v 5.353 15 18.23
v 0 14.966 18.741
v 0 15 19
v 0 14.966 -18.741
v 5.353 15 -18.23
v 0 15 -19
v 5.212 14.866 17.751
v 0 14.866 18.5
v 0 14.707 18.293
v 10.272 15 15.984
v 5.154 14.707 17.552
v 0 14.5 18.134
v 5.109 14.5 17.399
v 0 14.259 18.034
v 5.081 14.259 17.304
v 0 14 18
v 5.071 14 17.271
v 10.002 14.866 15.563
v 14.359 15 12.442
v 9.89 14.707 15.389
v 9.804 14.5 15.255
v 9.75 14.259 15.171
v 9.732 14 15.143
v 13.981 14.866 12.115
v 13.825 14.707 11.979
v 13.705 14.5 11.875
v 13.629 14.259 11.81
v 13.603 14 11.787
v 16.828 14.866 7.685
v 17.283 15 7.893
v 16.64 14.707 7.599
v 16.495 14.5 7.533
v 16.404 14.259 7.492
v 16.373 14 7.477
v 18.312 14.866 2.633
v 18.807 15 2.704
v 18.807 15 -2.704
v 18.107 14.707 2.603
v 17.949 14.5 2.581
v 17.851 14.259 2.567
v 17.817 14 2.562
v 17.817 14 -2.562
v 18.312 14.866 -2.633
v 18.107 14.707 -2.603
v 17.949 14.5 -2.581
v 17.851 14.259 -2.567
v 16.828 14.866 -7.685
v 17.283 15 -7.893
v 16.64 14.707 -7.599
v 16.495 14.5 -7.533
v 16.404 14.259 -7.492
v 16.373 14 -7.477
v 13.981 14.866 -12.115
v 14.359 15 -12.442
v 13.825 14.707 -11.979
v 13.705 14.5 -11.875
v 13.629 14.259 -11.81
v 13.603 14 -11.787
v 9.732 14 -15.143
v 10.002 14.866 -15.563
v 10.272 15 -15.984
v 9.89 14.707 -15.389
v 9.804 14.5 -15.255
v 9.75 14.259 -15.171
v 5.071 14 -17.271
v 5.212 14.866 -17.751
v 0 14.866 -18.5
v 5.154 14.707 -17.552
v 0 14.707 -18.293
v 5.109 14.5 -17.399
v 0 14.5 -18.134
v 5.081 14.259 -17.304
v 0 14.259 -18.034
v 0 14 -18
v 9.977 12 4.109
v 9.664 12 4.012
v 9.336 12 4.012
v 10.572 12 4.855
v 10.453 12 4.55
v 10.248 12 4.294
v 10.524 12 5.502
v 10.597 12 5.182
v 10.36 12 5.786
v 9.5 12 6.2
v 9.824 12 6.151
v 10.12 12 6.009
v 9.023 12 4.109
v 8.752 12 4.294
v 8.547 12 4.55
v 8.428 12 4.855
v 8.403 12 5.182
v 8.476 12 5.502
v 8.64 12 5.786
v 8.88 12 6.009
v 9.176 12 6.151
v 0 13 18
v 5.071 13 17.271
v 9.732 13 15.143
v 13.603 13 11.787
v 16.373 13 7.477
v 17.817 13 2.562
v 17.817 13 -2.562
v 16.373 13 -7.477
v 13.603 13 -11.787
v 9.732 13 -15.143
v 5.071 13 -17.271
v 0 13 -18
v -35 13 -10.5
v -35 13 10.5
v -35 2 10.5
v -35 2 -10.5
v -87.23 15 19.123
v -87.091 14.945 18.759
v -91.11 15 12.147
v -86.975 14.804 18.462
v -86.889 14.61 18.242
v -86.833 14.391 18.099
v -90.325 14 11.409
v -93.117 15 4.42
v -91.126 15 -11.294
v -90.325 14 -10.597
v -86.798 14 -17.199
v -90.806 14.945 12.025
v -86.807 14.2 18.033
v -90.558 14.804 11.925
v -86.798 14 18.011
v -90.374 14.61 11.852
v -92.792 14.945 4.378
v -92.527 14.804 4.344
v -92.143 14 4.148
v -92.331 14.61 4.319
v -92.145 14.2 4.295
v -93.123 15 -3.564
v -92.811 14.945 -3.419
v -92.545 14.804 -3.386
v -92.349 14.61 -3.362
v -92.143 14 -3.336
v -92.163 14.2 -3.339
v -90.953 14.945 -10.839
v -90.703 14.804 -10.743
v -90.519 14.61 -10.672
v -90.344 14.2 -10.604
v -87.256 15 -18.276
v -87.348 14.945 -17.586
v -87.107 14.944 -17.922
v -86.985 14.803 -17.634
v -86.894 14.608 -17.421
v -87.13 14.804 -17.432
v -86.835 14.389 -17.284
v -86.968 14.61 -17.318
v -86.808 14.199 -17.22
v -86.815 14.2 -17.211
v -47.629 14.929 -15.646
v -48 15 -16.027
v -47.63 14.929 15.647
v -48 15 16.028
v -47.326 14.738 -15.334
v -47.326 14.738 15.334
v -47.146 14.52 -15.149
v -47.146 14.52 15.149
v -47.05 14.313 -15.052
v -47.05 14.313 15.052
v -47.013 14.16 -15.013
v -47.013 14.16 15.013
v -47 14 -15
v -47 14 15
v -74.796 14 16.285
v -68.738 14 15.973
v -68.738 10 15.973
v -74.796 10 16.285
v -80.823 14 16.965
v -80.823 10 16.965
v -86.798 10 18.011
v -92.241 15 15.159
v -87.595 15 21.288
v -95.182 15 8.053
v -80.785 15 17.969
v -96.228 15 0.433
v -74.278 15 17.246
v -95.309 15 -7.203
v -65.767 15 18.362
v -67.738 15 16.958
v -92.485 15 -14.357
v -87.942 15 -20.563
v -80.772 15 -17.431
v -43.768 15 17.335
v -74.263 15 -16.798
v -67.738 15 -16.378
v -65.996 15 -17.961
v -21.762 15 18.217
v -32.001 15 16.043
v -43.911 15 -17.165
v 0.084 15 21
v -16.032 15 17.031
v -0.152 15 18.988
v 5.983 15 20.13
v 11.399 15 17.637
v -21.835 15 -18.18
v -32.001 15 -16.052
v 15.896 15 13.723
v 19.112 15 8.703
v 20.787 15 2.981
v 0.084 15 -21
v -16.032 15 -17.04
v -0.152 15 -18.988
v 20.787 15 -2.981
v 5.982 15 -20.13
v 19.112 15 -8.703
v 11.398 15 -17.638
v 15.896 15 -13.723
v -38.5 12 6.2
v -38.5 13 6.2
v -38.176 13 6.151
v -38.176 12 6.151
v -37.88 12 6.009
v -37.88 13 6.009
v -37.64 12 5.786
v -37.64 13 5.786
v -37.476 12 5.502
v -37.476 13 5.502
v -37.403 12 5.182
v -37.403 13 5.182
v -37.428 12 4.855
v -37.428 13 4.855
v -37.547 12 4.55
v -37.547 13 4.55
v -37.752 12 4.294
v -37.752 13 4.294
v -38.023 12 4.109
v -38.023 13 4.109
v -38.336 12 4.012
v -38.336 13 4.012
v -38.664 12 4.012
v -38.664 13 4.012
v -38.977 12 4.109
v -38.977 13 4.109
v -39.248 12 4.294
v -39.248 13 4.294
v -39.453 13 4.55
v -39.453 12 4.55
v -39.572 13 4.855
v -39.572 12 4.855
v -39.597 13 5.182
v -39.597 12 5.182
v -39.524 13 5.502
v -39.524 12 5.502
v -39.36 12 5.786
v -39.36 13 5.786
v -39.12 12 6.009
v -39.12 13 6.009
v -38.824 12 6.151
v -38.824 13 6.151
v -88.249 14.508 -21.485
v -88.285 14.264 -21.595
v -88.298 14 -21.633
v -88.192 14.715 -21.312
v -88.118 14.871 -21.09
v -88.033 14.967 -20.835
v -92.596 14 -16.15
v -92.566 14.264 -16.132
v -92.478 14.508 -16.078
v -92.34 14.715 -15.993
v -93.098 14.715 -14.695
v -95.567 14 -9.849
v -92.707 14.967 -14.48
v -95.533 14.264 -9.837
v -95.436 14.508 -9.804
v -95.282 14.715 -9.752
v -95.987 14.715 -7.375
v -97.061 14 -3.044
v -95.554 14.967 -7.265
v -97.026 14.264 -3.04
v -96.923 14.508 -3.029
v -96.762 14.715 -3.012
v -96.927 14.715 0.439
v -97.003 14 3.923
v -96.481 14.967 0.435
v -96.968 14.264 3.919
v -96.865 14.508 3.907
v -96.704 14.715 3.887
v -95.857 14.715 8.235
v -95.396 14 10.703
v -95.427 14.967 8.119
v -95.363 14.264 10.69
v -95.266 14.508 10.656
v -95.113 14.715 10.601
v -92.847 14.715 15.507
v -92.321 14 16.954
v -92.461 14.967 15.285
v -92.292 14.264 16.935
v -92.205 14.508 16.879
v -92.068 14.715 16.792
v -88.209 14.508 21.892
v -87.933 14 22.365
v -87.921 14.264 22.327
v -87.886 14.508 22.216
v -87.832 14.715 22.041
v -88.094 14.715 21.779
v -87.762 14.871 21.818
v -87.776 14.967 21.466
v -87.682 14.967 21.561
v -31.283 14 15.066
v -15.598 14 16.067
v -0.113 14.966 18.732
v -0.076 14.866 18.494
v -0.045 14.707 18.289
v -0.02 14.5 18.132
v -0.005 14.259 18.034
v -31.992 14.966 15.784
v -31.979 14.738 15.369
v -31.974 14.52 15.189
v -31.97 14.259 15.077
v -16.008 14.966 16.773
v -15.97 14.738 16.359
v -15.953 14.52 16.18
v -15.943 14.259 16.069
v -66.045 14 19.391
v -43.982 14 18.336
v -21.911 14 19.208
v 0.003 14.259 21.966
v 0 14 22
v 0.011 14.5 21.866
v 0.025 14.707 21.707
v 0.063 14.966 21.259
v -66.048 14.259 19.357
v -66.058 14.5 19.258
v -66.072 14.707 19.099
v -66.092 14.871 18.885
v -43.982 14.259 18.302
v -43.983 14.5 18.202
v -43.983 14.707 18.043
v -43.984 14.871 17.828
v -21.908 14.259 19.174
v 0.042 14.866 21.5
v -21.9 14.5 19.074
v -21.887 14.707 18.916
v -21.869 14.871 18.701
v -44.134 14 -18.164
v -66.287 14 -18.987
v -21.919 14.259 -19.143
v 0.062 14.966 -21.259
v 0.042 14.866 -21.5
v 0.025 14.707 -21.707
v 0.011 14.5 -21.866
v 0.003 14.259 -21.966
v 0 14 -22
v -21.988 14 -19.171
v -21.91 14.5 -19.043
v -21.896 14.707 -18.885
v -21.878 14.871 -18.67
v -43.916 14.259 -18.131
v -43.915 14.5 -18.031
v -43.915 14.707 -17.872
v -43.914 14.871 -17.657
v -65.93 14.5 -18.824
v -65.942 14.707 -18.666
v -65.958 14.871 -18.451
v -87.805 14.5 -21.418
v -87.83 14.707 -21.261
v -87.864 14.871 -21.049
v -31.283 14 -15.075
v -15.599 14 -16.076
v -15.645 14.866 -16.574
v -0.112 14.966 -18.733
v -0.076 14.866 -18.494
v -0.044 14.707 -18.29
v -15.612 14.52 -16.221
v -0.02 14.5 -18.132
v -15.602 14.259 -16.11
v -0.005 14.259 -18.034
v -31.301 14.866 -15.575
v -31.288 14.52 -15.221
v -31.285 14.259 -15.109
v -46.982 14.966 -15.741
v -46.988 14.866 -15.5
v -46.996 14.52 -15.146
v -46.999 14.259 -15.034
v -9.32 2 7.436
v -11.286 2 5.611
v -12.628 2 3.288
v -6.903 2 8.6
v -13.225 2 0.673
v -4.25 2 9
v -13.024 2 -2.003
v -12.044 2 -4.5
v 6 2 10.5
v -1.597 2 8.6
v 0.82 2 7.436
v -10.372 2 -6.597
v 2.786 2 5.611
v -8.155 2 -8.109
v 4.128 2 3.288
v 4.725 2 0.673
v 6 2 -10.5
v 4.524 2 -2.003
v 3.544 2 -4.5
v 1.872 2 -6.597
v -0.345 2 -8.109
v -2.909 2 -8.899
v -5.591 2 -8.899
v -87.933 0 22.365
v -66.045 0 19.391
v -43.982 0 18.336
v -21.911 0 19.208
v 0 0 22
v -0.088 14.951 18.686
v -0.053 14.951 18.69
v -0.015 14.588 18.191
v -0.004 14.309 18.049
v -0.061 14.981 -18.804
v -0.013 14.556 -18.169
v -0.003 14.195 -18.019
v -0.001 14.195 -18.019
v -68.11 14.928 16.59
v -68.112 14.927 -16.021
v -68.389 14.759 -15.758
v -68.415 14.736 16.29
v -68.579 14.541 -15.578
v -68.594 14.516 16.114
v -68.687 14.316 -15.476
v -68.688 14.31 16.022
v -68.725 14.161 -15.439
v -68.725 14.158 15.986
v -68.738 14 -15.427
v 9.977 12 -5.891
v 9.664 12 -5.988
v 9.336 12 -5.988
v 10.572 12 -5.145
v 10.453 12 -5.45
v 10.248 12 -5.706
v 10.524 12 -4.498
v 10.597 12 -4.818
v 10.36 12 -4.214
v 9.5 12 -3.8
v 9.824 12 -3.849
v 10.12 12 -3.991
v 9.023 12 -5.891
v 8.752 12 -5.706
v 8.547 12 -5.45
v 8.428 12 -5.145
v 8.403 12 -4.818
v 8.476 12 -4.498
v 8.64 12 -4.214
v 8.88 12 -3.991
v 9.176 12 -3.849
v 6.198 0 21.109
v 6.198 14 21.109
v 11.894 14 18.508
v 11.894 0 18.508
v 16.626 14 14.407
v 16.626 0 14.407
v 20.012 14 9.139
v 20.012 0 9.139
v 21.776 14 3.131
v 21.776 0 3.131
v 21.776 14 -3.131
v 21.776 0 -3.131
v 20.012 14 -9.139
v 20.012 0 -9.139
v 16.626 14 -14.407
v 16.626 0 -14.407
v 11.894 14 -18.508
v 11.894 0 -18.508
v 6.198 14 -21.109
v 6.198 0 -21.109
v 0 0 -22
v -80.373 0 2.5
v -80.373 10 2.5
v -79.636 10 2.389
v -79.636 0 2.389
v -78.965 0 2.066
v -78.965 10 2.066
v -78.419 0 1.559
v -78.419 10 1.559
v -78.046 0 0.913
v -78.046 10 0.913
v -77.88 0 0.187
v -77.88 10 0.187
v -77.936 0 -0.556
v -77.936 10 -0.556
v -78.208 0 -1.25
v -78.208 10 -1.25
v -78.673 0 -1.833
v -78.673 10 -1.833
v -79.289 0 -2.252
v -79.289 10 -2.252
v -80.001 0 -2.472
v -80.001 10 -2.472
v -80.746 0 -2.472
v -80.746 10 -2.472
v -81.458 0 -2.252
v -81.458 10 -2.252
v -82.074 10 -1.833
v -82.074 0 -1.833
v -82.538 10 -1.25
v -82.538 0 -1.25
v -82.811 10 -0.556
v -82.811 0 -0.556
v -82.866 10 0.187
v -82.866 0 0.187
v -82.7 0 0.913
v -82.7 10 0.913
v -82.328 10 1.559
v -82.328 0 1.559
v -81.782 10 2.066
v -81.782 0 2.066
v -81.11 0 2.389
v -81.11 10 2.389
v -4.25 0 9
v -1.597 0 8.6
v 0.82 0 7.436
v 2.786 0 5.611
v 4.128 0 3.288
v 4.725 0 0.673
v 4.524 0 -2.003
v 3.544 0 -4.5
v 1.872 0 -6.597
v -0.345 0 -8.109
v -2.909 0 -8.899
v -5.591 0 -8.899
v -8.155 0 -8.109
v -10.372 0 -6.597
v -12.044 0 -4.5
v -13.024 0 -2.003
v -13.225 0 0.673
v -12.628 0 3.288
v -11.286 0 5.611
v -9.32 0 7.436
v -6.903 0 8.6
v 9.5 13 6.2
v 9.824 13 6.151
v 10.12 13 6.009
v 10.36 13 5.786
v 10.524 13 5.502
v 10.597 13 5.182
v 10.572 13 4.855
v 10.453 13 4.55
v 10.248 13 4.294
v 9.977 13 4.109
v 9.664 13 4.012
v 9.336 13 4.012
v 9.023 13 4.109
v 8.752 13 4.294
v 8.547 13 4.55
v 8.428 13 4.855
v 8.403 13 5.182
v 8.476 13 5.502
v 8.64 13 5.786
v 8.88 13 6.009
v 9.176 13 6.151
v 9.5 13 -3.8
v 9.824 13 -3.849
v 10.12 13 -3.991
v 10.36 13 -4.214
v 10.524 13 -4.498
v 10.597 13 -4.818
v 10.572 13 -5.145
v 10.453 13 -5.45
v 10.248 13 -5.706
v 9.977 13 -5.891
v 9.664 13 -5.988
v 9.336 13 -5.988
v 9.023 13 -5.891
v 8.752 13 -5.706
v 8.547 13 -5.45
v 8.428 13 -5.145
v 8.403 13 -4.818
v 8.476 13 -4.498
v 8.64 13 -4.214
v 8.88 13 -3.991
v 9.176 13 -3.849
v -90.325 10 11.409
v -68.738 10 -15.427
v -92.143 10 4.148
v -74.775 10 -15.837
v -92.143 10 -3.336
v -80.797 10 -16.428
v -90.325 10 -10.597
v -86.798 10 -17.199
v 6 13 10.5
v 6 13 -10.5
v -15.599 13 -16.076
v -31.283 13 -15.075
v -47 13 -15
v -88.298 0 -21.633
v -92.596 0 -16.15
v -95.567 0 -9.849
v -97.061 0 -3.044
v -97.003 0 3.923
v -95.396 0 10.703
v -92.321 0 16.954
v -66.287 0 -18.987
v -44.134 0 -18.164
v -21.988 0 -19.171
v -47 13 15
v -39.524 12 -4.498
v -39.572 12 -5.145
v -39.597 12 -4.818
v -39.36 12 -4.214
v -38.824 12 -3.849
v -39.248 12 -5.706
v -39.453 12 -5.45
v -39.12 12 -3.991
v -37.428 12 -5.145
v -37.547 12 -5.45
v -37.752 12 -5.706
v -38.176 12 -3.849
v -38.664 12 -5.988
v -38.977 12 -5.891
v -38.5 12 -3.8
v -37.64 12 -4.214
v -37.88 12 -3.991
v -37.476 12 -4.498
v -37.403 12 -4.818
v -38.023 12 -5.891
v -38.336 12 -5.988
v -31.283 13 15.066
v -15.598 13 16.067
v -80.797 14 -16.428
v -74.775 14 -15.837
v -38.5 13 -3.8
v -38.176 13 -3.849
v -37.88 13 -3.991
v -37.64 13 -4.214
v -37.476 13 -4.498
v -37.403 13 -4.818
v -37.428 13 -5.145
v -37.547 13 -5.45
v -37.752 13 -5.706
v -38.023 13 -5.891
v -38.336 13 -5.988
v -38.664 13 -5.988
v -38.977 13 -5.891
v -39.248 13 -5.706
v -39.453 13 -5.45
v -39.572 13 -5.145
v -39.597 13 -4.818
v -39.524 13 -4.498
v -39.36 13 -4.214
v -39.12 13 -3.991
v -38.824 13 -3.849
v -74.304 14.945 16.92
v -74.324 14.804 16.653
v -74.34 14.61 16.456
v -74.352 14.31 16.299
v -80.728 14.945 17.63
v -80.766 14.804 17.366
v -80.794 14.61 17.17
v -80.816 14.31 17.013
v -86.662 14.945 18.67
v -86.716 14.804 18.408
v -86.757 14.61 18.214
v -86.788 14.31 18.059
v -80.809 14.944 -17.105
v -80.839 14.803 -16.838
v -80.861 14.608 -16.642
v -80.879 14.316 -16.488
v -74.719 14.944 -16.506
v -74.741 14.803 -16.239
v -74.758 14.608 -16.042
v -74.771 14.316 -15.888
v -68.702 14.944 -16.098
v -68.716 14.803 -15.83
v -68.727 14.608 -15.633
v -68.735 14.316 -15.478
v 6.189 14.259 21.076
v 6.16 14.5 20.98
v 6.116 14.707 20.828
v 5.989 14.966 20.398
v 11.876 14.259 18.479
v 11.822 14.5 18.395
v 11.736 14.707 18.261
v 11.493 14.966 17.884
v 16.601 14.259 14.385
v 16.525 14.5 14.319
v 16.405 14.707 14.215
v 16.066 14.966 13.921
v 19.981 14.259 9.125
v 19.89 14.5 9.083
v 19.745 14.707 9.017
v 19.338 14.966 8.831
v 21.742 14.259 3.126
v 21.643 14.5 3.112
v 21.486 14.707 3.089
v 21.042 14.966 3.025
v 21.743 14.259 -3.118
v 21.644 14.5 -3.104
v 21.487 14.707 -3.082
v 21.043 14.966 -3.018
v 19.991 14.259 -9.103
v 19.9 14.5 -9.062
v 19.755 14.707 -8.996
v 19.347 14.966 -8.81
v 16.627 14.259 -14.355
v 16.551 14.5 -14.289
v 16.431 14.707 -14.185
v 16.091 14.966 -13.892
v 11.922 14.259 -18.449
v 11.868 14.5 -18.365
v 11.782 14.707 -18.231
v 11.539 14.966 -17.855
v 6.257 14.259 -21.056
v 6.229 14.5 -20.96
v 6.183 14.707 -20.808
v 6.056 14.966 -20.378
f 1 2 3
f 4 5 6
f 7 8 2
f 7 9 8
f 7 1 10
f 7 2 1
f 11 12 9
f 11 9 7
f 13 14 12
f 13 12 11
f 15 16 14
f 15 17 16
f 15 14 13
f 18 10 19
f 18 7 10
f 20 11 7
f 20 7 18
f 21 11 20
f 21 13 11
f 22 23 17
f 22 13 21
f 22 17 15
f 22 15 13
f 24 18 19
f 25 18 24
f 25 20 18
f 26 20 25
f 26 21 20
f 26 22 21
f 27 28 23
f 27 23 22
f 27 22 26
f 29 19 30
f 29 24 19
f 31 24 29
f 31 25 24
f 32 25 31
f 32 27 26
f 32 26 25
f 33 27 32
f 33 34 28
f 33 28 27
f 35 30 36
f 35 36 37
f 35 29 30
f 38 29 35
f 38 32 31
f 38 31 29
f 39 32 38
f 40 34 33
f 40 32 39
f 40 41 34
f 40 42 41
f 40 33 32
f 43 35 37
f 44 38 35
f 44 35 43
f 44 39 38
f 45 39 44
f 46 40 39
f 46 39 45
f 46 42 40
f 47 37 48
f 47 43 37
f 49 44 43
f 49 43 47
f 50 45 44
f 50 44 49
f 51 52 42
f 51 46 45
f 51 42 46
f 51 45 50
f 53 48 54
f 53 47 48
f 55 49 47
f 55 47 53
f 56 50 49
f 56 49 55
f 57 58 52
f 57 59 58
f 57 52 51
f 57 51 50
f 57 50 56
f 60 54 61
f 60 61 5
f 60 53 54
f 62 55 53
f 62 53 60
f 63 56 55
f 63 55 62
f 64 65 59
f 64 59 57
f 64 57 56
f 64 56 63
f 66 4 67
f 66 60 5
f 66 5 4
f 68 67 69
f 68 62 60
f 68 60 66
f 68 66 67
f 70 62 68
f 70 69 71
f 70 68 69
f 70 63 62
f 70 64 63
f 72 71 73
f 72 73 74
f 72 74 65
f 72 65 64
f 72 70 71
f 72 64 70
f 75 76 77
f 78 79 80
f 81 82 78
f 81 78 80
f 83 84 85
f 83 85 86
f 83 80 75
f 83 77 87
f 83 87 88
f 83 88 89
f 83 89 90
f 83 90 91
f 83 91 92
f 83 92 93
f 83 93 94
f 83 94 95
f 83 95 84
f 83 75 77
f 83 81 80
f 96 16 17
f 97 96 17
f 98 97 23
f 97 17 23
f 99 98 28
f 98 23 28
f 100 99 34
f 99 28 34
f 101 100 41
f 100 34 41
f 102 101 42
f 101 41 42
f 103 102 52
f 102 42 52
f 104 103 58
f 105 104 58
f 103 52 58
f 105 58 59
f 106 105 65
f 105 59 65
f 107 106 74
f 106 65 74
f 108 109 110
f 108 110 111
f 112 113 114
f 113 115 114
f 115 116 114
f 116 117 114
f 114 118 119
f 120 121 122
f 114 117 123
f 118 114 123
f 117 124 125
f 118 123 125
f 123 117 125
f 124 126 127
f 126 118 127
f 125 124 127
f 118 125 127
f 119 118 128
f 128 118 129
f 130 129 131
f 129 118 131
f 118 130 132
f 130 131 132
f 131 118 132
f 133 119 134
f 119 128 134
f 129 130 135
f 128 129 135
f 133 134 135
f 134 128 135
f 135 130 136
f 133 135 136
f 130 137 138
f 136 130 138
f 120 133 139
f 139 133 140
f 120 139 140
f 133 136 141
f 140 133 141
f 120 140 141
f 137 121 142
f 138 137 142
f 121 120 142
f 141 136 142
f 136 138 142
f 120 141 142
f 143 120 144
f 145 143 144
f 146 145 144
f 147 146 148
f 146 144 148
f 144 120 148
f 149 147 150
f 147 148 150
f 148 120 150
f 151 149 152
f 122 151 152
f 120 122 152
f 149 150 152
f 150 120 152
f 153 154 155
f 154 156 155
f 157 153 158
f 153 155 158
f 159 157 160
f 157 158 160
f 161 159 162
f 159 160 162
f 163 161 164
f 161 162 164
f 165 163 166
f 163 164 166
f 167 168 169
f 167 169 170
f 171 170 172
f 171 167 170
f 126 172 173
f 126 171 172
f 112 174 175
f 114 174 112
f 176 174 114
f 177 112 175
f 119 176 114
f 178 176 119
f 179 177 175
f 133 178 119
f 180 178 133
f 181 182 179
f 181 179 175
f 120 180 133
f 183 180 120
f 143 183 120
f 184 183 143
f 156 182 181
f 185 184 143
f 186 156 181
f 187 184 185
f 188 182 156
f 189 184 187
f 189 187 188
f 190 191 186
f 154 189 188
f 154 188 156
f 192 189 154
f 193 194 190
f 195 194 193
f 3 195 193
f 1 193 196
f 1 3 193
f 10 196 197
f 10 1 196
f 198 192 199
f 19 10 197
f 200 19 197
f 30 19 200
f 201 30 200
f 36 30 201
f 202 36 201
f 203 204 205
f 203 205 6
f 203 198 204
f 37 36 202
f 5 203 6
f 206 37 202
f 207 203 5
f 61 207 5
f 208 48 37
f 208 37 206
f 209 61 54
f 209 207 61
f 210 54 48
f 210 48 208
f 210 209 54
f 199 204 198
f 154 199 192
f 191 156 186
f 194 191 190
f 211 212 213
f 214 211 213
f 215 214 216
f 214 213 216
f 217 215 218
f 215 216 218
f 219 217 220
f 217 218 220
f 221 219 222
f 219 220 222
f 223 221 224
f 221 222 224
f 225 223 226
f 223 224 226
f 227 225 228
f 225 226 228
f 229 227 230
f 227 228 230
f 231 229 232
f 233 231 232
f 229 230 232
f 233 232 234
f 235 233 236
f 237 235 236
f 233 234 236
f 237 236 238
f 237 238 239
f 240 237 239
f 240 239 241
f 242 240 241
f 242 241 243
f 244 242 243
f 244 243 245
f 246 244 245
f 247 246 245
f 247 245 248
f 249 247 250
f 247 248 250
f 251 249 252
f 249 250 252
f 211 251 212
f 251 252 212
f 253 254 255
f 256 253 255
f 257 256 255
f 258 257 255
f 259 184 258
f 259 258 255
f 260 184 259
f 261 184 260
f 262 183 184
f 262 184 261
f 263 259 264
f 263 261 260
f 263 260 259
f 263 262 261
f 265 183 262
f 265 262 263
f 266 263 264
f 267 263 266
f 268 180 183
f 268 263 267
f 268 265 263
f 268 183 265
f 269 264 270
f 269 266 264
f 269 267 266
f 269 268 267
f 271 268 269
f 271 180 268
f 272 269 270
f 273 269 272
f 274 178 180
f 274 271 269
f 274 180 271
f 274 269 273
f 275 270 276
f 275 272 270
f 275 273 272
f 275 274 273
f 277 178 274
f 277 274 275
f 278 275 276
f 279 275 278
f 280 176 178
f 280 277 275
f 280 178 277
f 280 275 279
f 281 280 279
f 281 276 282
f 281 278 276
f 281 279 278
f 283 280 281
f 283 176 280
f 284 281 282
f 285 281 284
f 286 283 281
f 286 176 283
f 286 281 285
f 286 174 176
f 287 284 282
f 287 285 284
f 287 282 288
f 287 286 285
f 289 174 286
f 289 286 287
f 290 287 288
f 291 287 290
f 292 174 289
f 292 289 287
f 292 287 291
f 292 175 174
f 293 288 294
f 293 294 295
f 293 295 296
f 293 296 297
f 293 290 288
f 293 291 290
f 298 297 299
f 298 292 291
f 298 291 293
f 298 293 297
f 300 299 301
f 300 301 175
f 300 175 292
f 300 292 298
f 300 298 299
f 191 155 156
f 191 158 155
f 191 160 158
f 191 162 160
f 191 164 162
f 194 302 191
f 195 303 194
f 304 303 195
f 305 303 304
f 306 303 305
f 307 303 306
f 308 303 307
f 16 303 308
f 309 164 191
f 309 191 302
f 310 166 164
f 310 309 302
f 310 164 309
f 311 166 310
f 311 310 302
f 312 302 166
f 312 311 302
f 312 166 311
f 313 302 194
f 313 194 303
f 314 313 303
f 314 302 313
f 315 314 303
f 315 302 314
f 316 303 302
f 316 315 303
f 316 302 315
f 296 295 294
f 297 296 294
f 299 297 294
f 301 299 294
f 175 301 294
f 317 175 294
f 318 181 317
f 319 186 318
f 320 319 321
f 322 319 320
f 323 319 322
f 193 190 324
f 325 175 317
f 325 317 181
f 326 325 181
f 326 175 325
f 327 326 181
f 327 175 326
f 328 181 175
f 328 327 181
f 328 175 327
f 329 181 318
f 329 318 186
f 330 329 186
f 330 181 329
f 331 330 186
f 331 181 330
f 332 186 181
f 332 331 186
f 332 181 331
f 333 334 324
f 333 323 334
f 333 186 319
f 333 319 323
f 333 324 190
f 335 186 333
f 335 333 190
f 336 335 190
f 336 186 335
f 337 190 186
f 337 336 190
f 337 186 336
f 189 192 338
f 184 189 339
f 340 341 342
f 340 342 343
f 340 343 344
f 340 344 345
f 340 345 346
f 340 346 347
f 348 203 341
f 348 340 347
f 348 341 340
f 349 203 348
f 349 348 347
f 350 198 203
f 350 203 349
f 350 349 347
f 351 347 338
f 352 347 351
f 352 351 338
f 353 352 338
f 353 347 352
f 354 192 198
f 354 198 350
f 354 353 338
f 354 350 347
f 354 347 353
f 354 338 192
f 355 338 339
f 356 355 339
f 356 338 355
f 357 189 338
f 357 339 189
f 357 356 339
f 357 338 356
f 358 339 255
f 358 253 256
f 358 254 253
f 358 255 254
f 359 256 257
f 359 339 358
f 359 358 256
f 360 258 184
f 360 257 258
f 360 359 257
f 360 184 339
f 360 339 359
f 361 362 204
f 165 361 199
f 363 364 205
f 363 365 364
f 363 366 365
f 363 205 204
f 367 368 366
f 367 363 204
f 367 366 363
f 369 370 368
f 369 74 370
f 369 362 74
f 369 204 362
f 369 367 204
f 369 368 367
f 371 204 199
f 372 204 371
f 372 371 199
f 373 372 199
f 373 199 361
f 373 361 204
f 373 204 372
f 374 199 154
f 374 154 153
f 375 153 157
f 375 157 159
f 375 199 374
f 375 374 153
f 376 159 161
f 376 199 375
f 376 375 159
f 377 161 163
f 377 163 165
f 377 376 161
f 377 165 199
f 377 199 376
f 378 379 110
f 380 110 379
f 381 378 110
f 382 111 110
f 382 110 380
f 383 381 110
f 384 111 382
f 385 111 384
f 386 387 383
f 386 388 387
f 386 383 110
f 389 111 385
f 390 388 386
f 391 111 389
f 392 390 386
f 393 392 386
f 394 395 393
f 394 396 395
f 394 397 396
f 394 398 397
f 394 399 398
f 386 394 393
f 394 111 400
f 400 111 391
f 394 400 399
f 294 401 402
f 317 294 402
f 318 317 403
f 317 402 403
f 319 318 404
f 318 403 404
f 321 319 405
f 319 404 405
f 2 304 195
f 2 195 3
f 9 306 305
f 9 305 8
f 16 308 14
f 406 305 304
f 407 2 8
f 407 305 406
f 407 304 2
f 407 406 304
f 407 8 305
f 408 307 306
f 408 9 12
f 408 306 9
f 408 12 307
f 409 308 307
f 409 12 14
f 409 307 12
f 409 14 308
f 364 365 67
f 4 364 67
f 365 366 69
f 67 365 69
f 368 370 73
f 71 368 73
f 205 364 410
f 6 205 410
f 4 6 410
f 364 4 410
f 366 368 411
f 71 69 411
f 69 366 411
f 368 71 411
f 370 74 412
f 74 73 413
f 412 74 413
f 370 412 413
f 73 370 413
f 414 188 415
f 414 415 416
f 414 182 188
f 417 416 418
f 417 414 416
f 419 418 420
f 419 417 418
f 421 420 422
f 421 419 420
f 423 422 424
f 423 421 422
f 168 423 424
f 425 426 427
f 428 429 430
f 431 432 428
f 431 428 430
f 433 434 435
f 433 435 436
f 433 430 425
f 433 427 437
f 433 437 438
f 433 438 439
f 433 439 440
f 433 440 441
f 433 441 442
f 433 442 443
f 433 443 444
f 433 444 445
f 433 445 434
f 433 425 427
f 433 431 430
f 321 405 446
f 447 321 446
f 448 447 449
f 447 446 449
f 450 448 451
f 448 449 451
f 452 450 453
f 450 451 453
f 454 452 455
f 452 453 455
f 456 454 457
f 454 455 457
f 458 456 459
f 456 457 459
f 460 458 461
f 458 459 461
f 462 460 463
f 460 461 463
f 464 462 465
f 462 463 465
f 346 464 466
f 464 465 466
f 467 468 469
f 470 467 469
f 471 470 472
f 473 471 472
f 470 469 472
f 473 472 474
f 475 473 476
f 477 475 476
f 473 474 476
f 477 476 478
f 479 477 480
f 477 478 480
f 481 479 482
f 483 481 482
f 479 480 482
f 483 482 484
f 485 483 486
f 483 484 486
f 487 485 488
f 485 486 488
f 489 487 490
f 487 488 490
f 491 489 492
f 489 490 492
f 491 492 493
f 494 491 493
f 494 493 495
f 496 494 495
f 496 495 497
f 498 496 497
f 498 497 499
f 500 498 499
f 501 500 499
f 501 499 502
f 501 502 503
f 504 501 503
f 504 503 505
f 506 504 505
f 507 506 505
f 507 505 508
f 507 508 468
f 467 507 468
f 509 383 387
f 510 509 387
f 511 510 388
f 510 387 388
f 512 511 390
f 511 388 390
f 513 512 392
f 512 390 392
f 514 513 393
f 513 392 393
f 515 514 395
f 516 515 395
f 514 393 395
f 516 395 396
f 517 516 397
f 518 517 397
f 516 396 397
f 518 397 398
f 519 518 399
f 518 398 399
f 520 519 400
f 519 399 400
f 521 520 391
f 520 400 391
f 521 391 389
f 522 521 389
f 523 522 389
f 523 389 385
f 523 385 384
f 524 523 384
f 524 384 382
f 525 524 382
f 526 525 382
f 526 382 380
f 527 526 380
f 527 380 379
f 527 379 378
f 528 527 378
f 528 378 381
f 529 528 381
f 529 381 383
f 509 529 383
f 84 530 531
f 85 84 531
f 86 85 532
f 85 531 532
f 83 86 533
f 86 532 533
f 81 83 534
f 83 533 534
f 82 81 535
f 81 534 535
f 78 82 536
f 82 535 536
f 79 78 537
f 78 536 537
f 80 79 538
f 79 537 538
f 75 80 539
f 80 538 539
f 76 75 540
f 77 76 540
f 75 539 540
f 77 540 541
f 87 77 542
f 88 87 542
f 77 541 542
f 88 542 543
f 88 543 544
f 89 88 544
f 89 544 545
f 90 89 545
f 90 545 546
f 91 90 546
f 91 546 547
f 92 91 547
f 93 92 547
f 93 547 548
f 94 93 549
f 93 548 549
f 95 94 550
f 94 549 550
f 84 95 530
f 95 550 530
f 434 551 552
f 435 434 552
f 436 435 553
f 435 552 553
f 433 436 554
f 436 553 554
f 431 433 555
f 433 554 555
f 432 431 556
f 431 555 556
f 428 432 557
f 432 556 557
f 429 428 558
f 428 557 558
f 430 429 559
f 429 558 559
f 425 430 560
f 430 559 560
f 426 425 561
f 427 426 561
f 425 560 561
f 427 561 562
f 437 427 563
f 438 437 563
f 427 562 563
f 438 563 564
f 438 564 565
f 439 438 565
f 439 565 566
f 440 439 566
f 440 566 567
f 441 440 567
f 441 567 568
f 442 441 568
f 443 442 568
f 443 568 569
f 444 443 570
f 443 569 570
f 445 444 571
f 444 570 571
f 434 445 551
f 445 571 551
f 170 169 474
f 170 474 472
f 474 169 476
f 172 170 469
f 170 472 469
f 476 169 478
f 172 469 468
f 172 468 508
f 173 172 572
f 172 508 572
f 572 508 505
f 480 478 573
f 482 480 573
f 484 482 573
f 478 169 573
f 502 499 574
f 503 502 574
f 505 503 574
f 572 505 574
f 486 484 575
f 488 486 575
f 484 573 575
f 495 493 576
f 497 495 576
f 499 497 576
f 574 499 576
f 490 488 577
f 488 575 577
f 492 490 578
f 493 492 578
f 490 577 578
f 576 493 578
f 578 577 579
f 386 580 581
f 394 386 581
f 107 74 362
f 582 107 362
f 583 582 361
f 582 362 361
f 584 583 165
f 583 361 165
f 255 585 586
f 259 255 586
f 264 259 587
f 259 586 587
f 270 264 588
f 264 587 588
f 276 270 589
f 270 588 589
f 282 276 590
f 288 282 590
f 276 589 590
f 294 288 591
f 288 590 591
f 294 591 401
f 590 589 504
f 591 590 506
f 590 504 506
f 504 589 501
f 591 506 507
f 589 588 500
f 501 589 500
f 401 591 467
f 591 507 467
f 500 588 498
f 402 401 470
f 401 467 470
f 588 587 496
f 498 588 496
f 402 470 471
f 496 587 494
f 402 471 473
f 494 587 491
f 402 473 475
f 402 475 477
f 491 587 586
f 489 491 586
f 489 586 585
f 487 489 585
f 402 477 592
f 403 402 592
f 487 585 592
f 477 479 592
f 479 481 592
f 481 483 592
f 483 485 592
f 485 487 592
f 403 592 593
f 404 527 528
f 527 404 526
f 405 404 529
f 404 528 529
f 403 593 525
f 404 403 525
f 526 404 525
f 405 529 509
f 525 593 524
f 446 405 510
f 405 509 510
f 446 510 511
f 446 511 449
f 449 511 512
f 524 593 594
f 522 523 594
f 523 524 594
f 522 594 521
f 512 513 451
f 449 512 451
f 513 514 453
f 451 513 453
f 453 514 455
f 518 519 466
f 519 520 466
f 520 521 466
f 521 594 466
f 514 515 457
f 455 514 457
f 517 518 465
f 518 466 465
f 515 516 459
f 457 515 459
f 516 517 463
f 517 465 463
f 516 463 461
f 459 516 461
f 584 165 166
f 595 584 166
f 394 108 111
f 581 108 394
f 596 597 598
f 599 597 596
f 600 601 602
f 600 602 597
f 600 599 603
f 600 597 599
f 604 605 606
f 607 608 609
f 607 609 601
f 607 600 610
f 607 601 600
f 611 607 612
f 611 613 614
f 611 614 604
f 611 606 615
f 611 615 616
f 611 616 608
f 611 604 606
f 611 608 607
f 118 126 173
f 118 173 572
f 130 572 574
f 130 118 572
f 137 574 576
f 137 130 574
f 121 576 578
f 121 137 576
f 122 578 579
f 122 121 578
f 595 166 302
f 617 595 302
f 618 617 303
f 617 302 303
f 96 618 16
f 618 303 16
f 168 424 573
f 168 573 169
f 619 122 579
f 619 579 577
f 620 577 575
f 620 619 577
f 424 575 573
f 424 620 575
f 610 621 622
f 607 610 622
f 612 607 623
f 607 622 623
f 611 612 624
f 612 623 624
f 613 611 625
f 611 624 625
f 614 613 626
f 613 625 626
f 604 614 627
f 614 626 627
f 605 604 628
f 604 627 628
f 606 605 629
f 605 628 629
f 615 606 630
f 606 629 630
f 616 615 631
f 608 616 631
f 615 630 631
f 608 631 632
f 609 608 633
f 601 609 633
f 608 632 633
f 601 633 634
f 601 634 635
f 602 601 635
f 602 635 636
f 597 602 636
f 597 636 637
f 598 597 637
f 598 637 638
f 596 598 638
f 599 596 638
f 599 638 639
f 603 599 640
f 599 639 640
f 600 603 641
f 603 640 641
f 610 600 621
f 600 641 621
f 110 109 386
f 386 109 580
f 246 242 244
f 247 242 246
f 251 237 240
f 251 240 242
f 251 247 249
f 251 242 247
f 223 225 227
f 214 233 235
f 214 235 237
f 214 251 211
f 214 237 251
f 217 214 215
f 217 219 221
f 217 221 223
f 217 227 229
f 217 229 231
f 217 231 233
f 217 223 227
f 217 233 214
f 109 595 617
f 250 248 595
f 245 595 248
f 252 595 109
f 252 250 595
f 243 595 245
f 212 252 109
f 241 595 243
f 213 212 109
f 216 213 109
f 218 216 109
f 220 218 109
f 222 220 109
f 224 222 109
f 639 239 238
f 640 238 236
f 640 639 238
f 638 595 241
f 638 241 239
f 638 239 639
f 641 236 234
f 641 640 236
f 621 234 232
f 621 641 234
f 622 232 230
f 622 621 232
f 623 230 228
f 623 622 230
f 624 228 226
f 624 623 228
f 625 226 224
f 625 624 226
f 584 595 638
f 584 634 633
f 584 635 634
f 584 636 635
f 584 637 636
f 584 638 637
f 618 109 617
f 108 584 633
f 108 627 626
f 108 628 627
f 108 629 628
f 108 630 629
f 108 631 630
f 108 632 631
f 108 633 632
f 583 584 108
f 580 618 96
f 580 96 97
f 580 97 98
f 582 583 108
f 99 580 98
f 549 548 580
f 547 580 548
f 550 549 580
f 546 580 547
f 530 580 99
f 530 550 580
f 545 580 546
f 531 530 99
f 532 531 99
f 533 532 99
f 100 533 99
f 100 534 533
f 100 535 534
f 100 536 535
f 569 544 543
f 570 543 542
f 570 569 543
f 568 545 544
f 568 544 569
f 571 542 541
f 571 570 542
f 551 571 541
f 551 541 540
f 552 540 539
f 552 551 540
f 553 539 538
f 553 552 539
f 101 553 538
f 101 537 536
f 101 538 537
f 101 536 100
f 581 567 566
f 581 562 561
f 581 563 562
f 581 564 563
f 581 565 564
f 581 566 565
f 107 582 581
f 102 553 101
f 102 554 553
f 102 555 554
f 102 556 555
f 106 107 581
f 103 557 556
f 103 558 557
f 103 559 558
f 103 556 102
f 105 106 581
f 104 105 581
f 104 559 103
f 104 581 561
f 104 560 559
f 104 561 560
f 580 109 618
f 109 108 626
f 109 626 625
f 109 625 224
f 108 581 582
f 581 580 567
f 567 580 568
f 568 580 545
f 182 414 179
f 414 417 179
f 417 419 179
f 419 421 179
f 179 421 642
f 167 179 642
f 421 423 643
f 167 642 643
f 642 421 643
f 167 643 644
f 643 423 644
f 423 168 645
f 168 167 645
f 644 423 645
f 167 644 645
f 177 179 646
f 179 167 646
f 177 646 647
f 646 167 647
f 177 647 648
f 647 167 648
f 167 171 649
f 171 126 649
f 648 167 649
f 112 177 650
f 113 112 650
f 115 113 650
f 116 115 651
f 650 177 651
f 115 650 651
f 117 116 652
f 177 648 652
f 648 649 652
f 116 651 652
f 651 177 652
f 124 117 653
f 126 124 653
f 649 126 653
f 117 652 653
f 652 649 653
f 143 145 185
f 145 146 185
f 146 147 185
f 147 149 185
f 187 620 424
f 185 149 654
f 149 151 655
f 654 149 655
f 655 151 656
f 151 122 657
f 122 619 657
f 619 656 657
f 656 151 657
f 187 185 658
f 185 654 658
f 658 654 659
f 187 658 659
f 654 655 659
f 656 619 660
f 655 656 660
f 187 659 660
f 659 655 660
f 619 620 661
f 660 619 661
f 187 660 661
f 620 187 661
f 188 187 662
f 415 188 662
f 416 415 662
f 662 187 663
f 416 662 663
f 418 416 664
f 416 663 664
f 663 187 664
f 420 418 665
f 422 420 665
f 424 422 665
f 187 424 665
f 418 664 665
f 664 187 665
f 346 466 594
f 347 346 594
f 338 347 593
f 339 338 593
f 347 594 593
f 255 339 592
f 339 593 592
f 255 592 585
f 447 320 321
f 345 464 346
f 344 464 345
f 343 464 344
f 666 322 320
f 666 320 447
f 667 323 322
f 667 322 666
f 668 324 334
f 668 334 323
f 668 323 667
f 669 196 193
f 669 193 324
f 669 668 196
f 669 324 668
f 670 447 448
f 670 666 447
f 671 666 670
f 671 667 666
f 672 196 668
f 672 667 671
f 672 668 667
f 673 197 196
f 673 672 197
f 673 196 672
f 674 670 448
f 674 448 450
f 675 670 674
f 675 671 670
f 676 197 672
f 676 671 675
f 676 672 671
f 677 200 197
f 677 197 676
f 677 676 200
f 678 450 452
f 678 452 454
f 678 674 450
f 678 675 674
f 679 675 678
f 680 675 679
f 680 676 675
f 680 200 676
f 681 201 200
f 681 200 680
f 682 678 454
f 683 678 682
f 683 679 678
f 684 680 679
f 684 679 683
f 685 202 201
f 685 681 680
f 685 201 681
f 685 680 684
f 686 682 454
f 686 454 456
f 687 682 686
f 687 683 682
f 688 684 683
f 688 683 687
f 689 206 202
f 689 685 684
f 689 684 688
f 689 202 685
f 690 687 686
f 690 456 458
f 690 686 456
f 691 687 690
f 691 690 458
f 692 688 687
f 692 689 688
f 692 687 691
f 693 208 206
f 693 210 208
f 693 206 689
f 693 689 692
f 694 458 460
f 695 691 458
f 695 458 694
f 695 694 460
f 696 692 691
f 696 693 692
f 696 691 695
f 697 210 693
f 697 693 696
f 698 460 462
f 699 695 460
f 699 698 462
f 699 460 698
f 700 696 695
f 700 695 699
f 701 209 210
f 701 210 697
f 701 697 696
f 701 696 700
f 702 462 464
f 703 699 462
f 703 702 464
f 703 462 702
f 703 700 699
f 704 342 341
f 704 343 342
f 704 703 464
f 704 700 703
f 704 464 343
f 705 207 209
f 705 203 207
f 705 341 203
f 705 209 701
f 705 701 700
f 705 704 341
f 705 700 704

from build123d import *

# Parameters (mm, degrees)
SALIENTE_EXTRUIR1_DEPTH = 15
CORTAR_EXTRUIR2_DEPTH   = 2
CROQUIS3_W              = 41
CROQUIS3_H              = 21
CORTAR_EXTRUIR3_DEPTH   = 11
CROQUIS4_R              = 9
CORTAR_EXTRUIR4_DEPTH   = 101.611139972
CROQUIS5_R              = 1.1
CORTAR_EXTRUIR5_DEPTH   = 1
CORTAR_EXTRUIR13_DEPTH  = 5
CROQUIS7_R              = 2.5
CORTAR_EXTRUIR14_DEPTH  = 101.267649251
REDONDEO2_R             = 1
REDONDEO3_R             = 1


with BuildPart() as part:
    # Croquis1 → Saliente-Extruir1 (new body)
    with BuildSketch(Plane(origin=(0, 0, 0), x_dir=(1, 0, 0), z_dir=(0, 1, 0))):
        with BuildLine():
            ThreePointArc((0, -22), (22, 0), (0, 22))
            ThreePointArc((0, 22), (-44.133753746, 18.164117738), (-88.297835717, 21.633422586))
            ThreePointArc((-88.297835717, 21.633422586), (-97.227552655, -0.44148233), (-87.932501095, -22.365060691))
            ThreePointArc((-87.932501095, -22.365060691), (-43.982219883, -18.335981845), (0, -22))
        make_face()
    extrude(amount=SALIENTE_EXTRUIR1_DEPTH)

    # Croquis2 → Cortar-Extruir2 (cut)
    with BuildSketch(Plane(origin=(0, 15, 0), x_dir=(1, 0, 0), z_dir=(0, 1, 0))):
        with BuildLine():
            Line((-47, 15), (-47, -15))
            ThreePointArc((-47, -15), (-23.432953151, -15.449599362), (0, -18))
            ThreePointArc((0, -18), (18, 0), (0, 18))
            ThreePointArc((0, 18), (-23.433623339, 15.460098979), (-47, 15))
        make_face()
    extrude(amount=-CORTAR_EXTRUIR2_DEPTH, mode=Mode.SUBTRACT)

    # Croquis3 → Cortar-Extruir3 (cut)
    with BuildSketch(Plane(origin=(0, 13, 0), x_dir=(1, 0, 0), z_dir=(0, 1, 0))):
        with Locations((-14.5, 0)):
            Rectangle(CROQUIS3_W, CROQUIS3_H)
    extrude(amount=-CORTAR_EXTRUIR3_DEPTH, mode=Mode.SUBTRACT)

    # Croquis4 → Cortar-Extruir4 (cut, through all)
    with BuildSketch(Plane(origin=(0, 2, 0), x_dir=(1, 0, 0), z_dir=(0, 1, 0))):
        with Locations(Location((-4.25, 0, 0), (0, 0, 270))):
            Circle(CROQUIS4_R)
    extrude(amount=-CORTAR_EXTRUIR4_DEPTH, mode=Mode.SUBTRACT)

    # Croquis5 → Cortar-Extruir5 (cut)
    with BuildSketch(Plane(origin=(0, 13, 0), x_dir=(1, 0, 0), z_dir=(0, 1, 0))):
        with Locations(Location((9.5, 4.9, 0), (0, 0, 270))):
            Circle(CROQUIS5_R)
        with Locations(Location((9.5, -5.1, 0), (0, 0, 270))):
            Circle(CROQUIS5_R)
        with Locations(Location((-38.5, 4.9, 0), (0, 0, 270))):
            Circle(CROQUIS5_R)
        with Locations(Location((-38.5, -5.1, 0), (0, 0, 270))):
            Circle(CROQUIS5_R)
    extrude(amount=-CORTAR_EXTRUIR5_DEPTH, mode=Mode.SUBTRACT)

    # Croquis6 → Cortar-Extruir13 (cut)
    with BuildSketch(Plane(origin=(0, 15, 0), x_dir=(1, 0, 0), z_dir=(0, 1, 0))):
        with BuildLine():
            Line((-68.737734773, 15.427092138), (-68.737734773, -15.97347445))
            ThreePointArc((-68.737734773, -15.97347445), (-77.814777004, -16.578592838), (-86.798496184, -18.010952302))
            ThreePointArc((-86.798496184, -18.010952302), (-92.373186804, -0.406006346), (-86.798496184, 17.198939611))
            ThreePointArc((-86.798496184, 17.198939611), (-77.788079973, 16.109514175), (-68.737734773, 15.427092138))
        make_face()
    extrude(amount=-CORTAR_EXTRUIR13_DEPTH, mode=Mode.SUBTRACT)

    # Croquis7 → Cortar-Extruir14 (cut, through all)
    with BuildSketch(Plane(origin=(0, 10, 0), x_dir=(1, 0, 0), z_dir=(0, 1, 0))):
        with Locations(Location((-80.373306938, 0, 0), (0, 0, 270))):
            Circle(CROQUIS7_R)
    extrude(amount=-CORTAR_EXTRUIR14_DEPTH, mode=Mode.SUBTRACT)

    # Redondeo2
    # the kernel refuses this fillet: 1 mm, written as the material it takes off along each edge
    with BuildSketch(Plane(origin=(-42.931069519, 15, 271.527527752), x_dir=(-0.1874431998722677, 0, -0.9822754434585266), z_dir=(-0.9822754434585266, 0, 0.1874431998722677))) as redondeo2_piece_1:
        with BuildLine():
            CenterArc((253.193727877 + REDONDEO2_R, REDONDEO2_R), REDONDEO2_R, 180, 90)
            Line((253.193727877 + REDONDEO2_R, 0), (253.193727877, 0))
            Line((253.193727877, 0), (253.193727877, REDONDEO2_R))
        make_face()
    revolve(axis=Axis((-42.931069519, 15, 271.527527752), (0, -1, 0)), revolution_arc=21.131483712, mode=Mode.SUBTRACT)
    with BuildSketch(Plane(origin=(0, 15, 0), x_dir=(-0.11357352107267706, 0, 0.9935295945824433), z_dir=(-0.9935295945824433, 0, -0.11357352107267706))) as redondeo2_piece_2:
        with BuildLine():
            CenterArc((22 - REDONDEO2_R, -REDONDEO2_R), REDONDEO2_R, 0, 90)
            Line((22 - REDONDEO2_R, 0), (22, 0))
            Line((22, 0), (22, -REDONDEO2_R))
        make_face()
    revolve(axis=Axis((0, 15, 0), (0, 1, 0)), revolution_arc=193.042709536, mode=Mode.SUBTRACT)
    with BuildSketch(Plane(origin=(-45.249041595, 15, -286.804517852), x_dir=(0.17760158469161672, 0, 0.9841024728731386), z_dir=(0.9841024728731386, 0, -0.17760158469161672))) as redondeo2_piece_3:
        with BuildLine():
            CenterArc((268.642715219 + REDONDEO2_R, REDONDEO2_R), REDONDEO2_R, 180, 90)
            Line((268.642715219, REDONDEO2_R), (268.642715219, 0))
            Line((268.642715219, 0), (268.642715219 + REDONDEO2_R, 0))
        make_face()
    revolve(axis=Axis((-45.249041595, 15, -286.804517852), (0, -1, 0)), revolution_arc=19.984444172, mode=Mode.SUBTRACT)
    with BuildSketch(Plane(origin=(-66.115926768, 15, 0.183151741), x_dir=(-0.6543449081005462, 0, -0.7561962319681894), z_dir=(0.7561962319681894, 0, -0.6543449081005462))) as redondeo2_piece_4:
        with BuildLine():
            CenterArc((31.112698372 - REDONDEO2_R, -REDONDEO2_R), REDONDEO2_R, 0, 90)
            Line((31.112698372 - REDONDEO2_R, 0), (31.112698372, 0))
            Line((31.112698372, 0), (31.112698372, -REDONDEO2_R))
        make_face()
    revolve(axis=Axis((-66.115926768, 15, 0.183151741), (0, 1, 0)), revolution_arc=99.211479347, mode=Mode.SUBTRACT)

    # Redondeo3
    redondeo3_edges = [part.edges().sort_by_distance(p)[0] for p in [
        (-23.433623339, 15, -15.460098979),
        (-47, 15, 0),
        (-23.432953151, 15, 15.449599362),
        (18, 15, 0),
        (-77.788079973, 15, -16.109514175),
        (-68.737734773, 15, 0.273191156),
        (-92.373186804, 15, 0.406006346),
        (-77.814777004, 15, 16.578592838),
    ]]
    fillet(redondeo3_edges, radius=REDONDEO3_R)


solid = part.part
